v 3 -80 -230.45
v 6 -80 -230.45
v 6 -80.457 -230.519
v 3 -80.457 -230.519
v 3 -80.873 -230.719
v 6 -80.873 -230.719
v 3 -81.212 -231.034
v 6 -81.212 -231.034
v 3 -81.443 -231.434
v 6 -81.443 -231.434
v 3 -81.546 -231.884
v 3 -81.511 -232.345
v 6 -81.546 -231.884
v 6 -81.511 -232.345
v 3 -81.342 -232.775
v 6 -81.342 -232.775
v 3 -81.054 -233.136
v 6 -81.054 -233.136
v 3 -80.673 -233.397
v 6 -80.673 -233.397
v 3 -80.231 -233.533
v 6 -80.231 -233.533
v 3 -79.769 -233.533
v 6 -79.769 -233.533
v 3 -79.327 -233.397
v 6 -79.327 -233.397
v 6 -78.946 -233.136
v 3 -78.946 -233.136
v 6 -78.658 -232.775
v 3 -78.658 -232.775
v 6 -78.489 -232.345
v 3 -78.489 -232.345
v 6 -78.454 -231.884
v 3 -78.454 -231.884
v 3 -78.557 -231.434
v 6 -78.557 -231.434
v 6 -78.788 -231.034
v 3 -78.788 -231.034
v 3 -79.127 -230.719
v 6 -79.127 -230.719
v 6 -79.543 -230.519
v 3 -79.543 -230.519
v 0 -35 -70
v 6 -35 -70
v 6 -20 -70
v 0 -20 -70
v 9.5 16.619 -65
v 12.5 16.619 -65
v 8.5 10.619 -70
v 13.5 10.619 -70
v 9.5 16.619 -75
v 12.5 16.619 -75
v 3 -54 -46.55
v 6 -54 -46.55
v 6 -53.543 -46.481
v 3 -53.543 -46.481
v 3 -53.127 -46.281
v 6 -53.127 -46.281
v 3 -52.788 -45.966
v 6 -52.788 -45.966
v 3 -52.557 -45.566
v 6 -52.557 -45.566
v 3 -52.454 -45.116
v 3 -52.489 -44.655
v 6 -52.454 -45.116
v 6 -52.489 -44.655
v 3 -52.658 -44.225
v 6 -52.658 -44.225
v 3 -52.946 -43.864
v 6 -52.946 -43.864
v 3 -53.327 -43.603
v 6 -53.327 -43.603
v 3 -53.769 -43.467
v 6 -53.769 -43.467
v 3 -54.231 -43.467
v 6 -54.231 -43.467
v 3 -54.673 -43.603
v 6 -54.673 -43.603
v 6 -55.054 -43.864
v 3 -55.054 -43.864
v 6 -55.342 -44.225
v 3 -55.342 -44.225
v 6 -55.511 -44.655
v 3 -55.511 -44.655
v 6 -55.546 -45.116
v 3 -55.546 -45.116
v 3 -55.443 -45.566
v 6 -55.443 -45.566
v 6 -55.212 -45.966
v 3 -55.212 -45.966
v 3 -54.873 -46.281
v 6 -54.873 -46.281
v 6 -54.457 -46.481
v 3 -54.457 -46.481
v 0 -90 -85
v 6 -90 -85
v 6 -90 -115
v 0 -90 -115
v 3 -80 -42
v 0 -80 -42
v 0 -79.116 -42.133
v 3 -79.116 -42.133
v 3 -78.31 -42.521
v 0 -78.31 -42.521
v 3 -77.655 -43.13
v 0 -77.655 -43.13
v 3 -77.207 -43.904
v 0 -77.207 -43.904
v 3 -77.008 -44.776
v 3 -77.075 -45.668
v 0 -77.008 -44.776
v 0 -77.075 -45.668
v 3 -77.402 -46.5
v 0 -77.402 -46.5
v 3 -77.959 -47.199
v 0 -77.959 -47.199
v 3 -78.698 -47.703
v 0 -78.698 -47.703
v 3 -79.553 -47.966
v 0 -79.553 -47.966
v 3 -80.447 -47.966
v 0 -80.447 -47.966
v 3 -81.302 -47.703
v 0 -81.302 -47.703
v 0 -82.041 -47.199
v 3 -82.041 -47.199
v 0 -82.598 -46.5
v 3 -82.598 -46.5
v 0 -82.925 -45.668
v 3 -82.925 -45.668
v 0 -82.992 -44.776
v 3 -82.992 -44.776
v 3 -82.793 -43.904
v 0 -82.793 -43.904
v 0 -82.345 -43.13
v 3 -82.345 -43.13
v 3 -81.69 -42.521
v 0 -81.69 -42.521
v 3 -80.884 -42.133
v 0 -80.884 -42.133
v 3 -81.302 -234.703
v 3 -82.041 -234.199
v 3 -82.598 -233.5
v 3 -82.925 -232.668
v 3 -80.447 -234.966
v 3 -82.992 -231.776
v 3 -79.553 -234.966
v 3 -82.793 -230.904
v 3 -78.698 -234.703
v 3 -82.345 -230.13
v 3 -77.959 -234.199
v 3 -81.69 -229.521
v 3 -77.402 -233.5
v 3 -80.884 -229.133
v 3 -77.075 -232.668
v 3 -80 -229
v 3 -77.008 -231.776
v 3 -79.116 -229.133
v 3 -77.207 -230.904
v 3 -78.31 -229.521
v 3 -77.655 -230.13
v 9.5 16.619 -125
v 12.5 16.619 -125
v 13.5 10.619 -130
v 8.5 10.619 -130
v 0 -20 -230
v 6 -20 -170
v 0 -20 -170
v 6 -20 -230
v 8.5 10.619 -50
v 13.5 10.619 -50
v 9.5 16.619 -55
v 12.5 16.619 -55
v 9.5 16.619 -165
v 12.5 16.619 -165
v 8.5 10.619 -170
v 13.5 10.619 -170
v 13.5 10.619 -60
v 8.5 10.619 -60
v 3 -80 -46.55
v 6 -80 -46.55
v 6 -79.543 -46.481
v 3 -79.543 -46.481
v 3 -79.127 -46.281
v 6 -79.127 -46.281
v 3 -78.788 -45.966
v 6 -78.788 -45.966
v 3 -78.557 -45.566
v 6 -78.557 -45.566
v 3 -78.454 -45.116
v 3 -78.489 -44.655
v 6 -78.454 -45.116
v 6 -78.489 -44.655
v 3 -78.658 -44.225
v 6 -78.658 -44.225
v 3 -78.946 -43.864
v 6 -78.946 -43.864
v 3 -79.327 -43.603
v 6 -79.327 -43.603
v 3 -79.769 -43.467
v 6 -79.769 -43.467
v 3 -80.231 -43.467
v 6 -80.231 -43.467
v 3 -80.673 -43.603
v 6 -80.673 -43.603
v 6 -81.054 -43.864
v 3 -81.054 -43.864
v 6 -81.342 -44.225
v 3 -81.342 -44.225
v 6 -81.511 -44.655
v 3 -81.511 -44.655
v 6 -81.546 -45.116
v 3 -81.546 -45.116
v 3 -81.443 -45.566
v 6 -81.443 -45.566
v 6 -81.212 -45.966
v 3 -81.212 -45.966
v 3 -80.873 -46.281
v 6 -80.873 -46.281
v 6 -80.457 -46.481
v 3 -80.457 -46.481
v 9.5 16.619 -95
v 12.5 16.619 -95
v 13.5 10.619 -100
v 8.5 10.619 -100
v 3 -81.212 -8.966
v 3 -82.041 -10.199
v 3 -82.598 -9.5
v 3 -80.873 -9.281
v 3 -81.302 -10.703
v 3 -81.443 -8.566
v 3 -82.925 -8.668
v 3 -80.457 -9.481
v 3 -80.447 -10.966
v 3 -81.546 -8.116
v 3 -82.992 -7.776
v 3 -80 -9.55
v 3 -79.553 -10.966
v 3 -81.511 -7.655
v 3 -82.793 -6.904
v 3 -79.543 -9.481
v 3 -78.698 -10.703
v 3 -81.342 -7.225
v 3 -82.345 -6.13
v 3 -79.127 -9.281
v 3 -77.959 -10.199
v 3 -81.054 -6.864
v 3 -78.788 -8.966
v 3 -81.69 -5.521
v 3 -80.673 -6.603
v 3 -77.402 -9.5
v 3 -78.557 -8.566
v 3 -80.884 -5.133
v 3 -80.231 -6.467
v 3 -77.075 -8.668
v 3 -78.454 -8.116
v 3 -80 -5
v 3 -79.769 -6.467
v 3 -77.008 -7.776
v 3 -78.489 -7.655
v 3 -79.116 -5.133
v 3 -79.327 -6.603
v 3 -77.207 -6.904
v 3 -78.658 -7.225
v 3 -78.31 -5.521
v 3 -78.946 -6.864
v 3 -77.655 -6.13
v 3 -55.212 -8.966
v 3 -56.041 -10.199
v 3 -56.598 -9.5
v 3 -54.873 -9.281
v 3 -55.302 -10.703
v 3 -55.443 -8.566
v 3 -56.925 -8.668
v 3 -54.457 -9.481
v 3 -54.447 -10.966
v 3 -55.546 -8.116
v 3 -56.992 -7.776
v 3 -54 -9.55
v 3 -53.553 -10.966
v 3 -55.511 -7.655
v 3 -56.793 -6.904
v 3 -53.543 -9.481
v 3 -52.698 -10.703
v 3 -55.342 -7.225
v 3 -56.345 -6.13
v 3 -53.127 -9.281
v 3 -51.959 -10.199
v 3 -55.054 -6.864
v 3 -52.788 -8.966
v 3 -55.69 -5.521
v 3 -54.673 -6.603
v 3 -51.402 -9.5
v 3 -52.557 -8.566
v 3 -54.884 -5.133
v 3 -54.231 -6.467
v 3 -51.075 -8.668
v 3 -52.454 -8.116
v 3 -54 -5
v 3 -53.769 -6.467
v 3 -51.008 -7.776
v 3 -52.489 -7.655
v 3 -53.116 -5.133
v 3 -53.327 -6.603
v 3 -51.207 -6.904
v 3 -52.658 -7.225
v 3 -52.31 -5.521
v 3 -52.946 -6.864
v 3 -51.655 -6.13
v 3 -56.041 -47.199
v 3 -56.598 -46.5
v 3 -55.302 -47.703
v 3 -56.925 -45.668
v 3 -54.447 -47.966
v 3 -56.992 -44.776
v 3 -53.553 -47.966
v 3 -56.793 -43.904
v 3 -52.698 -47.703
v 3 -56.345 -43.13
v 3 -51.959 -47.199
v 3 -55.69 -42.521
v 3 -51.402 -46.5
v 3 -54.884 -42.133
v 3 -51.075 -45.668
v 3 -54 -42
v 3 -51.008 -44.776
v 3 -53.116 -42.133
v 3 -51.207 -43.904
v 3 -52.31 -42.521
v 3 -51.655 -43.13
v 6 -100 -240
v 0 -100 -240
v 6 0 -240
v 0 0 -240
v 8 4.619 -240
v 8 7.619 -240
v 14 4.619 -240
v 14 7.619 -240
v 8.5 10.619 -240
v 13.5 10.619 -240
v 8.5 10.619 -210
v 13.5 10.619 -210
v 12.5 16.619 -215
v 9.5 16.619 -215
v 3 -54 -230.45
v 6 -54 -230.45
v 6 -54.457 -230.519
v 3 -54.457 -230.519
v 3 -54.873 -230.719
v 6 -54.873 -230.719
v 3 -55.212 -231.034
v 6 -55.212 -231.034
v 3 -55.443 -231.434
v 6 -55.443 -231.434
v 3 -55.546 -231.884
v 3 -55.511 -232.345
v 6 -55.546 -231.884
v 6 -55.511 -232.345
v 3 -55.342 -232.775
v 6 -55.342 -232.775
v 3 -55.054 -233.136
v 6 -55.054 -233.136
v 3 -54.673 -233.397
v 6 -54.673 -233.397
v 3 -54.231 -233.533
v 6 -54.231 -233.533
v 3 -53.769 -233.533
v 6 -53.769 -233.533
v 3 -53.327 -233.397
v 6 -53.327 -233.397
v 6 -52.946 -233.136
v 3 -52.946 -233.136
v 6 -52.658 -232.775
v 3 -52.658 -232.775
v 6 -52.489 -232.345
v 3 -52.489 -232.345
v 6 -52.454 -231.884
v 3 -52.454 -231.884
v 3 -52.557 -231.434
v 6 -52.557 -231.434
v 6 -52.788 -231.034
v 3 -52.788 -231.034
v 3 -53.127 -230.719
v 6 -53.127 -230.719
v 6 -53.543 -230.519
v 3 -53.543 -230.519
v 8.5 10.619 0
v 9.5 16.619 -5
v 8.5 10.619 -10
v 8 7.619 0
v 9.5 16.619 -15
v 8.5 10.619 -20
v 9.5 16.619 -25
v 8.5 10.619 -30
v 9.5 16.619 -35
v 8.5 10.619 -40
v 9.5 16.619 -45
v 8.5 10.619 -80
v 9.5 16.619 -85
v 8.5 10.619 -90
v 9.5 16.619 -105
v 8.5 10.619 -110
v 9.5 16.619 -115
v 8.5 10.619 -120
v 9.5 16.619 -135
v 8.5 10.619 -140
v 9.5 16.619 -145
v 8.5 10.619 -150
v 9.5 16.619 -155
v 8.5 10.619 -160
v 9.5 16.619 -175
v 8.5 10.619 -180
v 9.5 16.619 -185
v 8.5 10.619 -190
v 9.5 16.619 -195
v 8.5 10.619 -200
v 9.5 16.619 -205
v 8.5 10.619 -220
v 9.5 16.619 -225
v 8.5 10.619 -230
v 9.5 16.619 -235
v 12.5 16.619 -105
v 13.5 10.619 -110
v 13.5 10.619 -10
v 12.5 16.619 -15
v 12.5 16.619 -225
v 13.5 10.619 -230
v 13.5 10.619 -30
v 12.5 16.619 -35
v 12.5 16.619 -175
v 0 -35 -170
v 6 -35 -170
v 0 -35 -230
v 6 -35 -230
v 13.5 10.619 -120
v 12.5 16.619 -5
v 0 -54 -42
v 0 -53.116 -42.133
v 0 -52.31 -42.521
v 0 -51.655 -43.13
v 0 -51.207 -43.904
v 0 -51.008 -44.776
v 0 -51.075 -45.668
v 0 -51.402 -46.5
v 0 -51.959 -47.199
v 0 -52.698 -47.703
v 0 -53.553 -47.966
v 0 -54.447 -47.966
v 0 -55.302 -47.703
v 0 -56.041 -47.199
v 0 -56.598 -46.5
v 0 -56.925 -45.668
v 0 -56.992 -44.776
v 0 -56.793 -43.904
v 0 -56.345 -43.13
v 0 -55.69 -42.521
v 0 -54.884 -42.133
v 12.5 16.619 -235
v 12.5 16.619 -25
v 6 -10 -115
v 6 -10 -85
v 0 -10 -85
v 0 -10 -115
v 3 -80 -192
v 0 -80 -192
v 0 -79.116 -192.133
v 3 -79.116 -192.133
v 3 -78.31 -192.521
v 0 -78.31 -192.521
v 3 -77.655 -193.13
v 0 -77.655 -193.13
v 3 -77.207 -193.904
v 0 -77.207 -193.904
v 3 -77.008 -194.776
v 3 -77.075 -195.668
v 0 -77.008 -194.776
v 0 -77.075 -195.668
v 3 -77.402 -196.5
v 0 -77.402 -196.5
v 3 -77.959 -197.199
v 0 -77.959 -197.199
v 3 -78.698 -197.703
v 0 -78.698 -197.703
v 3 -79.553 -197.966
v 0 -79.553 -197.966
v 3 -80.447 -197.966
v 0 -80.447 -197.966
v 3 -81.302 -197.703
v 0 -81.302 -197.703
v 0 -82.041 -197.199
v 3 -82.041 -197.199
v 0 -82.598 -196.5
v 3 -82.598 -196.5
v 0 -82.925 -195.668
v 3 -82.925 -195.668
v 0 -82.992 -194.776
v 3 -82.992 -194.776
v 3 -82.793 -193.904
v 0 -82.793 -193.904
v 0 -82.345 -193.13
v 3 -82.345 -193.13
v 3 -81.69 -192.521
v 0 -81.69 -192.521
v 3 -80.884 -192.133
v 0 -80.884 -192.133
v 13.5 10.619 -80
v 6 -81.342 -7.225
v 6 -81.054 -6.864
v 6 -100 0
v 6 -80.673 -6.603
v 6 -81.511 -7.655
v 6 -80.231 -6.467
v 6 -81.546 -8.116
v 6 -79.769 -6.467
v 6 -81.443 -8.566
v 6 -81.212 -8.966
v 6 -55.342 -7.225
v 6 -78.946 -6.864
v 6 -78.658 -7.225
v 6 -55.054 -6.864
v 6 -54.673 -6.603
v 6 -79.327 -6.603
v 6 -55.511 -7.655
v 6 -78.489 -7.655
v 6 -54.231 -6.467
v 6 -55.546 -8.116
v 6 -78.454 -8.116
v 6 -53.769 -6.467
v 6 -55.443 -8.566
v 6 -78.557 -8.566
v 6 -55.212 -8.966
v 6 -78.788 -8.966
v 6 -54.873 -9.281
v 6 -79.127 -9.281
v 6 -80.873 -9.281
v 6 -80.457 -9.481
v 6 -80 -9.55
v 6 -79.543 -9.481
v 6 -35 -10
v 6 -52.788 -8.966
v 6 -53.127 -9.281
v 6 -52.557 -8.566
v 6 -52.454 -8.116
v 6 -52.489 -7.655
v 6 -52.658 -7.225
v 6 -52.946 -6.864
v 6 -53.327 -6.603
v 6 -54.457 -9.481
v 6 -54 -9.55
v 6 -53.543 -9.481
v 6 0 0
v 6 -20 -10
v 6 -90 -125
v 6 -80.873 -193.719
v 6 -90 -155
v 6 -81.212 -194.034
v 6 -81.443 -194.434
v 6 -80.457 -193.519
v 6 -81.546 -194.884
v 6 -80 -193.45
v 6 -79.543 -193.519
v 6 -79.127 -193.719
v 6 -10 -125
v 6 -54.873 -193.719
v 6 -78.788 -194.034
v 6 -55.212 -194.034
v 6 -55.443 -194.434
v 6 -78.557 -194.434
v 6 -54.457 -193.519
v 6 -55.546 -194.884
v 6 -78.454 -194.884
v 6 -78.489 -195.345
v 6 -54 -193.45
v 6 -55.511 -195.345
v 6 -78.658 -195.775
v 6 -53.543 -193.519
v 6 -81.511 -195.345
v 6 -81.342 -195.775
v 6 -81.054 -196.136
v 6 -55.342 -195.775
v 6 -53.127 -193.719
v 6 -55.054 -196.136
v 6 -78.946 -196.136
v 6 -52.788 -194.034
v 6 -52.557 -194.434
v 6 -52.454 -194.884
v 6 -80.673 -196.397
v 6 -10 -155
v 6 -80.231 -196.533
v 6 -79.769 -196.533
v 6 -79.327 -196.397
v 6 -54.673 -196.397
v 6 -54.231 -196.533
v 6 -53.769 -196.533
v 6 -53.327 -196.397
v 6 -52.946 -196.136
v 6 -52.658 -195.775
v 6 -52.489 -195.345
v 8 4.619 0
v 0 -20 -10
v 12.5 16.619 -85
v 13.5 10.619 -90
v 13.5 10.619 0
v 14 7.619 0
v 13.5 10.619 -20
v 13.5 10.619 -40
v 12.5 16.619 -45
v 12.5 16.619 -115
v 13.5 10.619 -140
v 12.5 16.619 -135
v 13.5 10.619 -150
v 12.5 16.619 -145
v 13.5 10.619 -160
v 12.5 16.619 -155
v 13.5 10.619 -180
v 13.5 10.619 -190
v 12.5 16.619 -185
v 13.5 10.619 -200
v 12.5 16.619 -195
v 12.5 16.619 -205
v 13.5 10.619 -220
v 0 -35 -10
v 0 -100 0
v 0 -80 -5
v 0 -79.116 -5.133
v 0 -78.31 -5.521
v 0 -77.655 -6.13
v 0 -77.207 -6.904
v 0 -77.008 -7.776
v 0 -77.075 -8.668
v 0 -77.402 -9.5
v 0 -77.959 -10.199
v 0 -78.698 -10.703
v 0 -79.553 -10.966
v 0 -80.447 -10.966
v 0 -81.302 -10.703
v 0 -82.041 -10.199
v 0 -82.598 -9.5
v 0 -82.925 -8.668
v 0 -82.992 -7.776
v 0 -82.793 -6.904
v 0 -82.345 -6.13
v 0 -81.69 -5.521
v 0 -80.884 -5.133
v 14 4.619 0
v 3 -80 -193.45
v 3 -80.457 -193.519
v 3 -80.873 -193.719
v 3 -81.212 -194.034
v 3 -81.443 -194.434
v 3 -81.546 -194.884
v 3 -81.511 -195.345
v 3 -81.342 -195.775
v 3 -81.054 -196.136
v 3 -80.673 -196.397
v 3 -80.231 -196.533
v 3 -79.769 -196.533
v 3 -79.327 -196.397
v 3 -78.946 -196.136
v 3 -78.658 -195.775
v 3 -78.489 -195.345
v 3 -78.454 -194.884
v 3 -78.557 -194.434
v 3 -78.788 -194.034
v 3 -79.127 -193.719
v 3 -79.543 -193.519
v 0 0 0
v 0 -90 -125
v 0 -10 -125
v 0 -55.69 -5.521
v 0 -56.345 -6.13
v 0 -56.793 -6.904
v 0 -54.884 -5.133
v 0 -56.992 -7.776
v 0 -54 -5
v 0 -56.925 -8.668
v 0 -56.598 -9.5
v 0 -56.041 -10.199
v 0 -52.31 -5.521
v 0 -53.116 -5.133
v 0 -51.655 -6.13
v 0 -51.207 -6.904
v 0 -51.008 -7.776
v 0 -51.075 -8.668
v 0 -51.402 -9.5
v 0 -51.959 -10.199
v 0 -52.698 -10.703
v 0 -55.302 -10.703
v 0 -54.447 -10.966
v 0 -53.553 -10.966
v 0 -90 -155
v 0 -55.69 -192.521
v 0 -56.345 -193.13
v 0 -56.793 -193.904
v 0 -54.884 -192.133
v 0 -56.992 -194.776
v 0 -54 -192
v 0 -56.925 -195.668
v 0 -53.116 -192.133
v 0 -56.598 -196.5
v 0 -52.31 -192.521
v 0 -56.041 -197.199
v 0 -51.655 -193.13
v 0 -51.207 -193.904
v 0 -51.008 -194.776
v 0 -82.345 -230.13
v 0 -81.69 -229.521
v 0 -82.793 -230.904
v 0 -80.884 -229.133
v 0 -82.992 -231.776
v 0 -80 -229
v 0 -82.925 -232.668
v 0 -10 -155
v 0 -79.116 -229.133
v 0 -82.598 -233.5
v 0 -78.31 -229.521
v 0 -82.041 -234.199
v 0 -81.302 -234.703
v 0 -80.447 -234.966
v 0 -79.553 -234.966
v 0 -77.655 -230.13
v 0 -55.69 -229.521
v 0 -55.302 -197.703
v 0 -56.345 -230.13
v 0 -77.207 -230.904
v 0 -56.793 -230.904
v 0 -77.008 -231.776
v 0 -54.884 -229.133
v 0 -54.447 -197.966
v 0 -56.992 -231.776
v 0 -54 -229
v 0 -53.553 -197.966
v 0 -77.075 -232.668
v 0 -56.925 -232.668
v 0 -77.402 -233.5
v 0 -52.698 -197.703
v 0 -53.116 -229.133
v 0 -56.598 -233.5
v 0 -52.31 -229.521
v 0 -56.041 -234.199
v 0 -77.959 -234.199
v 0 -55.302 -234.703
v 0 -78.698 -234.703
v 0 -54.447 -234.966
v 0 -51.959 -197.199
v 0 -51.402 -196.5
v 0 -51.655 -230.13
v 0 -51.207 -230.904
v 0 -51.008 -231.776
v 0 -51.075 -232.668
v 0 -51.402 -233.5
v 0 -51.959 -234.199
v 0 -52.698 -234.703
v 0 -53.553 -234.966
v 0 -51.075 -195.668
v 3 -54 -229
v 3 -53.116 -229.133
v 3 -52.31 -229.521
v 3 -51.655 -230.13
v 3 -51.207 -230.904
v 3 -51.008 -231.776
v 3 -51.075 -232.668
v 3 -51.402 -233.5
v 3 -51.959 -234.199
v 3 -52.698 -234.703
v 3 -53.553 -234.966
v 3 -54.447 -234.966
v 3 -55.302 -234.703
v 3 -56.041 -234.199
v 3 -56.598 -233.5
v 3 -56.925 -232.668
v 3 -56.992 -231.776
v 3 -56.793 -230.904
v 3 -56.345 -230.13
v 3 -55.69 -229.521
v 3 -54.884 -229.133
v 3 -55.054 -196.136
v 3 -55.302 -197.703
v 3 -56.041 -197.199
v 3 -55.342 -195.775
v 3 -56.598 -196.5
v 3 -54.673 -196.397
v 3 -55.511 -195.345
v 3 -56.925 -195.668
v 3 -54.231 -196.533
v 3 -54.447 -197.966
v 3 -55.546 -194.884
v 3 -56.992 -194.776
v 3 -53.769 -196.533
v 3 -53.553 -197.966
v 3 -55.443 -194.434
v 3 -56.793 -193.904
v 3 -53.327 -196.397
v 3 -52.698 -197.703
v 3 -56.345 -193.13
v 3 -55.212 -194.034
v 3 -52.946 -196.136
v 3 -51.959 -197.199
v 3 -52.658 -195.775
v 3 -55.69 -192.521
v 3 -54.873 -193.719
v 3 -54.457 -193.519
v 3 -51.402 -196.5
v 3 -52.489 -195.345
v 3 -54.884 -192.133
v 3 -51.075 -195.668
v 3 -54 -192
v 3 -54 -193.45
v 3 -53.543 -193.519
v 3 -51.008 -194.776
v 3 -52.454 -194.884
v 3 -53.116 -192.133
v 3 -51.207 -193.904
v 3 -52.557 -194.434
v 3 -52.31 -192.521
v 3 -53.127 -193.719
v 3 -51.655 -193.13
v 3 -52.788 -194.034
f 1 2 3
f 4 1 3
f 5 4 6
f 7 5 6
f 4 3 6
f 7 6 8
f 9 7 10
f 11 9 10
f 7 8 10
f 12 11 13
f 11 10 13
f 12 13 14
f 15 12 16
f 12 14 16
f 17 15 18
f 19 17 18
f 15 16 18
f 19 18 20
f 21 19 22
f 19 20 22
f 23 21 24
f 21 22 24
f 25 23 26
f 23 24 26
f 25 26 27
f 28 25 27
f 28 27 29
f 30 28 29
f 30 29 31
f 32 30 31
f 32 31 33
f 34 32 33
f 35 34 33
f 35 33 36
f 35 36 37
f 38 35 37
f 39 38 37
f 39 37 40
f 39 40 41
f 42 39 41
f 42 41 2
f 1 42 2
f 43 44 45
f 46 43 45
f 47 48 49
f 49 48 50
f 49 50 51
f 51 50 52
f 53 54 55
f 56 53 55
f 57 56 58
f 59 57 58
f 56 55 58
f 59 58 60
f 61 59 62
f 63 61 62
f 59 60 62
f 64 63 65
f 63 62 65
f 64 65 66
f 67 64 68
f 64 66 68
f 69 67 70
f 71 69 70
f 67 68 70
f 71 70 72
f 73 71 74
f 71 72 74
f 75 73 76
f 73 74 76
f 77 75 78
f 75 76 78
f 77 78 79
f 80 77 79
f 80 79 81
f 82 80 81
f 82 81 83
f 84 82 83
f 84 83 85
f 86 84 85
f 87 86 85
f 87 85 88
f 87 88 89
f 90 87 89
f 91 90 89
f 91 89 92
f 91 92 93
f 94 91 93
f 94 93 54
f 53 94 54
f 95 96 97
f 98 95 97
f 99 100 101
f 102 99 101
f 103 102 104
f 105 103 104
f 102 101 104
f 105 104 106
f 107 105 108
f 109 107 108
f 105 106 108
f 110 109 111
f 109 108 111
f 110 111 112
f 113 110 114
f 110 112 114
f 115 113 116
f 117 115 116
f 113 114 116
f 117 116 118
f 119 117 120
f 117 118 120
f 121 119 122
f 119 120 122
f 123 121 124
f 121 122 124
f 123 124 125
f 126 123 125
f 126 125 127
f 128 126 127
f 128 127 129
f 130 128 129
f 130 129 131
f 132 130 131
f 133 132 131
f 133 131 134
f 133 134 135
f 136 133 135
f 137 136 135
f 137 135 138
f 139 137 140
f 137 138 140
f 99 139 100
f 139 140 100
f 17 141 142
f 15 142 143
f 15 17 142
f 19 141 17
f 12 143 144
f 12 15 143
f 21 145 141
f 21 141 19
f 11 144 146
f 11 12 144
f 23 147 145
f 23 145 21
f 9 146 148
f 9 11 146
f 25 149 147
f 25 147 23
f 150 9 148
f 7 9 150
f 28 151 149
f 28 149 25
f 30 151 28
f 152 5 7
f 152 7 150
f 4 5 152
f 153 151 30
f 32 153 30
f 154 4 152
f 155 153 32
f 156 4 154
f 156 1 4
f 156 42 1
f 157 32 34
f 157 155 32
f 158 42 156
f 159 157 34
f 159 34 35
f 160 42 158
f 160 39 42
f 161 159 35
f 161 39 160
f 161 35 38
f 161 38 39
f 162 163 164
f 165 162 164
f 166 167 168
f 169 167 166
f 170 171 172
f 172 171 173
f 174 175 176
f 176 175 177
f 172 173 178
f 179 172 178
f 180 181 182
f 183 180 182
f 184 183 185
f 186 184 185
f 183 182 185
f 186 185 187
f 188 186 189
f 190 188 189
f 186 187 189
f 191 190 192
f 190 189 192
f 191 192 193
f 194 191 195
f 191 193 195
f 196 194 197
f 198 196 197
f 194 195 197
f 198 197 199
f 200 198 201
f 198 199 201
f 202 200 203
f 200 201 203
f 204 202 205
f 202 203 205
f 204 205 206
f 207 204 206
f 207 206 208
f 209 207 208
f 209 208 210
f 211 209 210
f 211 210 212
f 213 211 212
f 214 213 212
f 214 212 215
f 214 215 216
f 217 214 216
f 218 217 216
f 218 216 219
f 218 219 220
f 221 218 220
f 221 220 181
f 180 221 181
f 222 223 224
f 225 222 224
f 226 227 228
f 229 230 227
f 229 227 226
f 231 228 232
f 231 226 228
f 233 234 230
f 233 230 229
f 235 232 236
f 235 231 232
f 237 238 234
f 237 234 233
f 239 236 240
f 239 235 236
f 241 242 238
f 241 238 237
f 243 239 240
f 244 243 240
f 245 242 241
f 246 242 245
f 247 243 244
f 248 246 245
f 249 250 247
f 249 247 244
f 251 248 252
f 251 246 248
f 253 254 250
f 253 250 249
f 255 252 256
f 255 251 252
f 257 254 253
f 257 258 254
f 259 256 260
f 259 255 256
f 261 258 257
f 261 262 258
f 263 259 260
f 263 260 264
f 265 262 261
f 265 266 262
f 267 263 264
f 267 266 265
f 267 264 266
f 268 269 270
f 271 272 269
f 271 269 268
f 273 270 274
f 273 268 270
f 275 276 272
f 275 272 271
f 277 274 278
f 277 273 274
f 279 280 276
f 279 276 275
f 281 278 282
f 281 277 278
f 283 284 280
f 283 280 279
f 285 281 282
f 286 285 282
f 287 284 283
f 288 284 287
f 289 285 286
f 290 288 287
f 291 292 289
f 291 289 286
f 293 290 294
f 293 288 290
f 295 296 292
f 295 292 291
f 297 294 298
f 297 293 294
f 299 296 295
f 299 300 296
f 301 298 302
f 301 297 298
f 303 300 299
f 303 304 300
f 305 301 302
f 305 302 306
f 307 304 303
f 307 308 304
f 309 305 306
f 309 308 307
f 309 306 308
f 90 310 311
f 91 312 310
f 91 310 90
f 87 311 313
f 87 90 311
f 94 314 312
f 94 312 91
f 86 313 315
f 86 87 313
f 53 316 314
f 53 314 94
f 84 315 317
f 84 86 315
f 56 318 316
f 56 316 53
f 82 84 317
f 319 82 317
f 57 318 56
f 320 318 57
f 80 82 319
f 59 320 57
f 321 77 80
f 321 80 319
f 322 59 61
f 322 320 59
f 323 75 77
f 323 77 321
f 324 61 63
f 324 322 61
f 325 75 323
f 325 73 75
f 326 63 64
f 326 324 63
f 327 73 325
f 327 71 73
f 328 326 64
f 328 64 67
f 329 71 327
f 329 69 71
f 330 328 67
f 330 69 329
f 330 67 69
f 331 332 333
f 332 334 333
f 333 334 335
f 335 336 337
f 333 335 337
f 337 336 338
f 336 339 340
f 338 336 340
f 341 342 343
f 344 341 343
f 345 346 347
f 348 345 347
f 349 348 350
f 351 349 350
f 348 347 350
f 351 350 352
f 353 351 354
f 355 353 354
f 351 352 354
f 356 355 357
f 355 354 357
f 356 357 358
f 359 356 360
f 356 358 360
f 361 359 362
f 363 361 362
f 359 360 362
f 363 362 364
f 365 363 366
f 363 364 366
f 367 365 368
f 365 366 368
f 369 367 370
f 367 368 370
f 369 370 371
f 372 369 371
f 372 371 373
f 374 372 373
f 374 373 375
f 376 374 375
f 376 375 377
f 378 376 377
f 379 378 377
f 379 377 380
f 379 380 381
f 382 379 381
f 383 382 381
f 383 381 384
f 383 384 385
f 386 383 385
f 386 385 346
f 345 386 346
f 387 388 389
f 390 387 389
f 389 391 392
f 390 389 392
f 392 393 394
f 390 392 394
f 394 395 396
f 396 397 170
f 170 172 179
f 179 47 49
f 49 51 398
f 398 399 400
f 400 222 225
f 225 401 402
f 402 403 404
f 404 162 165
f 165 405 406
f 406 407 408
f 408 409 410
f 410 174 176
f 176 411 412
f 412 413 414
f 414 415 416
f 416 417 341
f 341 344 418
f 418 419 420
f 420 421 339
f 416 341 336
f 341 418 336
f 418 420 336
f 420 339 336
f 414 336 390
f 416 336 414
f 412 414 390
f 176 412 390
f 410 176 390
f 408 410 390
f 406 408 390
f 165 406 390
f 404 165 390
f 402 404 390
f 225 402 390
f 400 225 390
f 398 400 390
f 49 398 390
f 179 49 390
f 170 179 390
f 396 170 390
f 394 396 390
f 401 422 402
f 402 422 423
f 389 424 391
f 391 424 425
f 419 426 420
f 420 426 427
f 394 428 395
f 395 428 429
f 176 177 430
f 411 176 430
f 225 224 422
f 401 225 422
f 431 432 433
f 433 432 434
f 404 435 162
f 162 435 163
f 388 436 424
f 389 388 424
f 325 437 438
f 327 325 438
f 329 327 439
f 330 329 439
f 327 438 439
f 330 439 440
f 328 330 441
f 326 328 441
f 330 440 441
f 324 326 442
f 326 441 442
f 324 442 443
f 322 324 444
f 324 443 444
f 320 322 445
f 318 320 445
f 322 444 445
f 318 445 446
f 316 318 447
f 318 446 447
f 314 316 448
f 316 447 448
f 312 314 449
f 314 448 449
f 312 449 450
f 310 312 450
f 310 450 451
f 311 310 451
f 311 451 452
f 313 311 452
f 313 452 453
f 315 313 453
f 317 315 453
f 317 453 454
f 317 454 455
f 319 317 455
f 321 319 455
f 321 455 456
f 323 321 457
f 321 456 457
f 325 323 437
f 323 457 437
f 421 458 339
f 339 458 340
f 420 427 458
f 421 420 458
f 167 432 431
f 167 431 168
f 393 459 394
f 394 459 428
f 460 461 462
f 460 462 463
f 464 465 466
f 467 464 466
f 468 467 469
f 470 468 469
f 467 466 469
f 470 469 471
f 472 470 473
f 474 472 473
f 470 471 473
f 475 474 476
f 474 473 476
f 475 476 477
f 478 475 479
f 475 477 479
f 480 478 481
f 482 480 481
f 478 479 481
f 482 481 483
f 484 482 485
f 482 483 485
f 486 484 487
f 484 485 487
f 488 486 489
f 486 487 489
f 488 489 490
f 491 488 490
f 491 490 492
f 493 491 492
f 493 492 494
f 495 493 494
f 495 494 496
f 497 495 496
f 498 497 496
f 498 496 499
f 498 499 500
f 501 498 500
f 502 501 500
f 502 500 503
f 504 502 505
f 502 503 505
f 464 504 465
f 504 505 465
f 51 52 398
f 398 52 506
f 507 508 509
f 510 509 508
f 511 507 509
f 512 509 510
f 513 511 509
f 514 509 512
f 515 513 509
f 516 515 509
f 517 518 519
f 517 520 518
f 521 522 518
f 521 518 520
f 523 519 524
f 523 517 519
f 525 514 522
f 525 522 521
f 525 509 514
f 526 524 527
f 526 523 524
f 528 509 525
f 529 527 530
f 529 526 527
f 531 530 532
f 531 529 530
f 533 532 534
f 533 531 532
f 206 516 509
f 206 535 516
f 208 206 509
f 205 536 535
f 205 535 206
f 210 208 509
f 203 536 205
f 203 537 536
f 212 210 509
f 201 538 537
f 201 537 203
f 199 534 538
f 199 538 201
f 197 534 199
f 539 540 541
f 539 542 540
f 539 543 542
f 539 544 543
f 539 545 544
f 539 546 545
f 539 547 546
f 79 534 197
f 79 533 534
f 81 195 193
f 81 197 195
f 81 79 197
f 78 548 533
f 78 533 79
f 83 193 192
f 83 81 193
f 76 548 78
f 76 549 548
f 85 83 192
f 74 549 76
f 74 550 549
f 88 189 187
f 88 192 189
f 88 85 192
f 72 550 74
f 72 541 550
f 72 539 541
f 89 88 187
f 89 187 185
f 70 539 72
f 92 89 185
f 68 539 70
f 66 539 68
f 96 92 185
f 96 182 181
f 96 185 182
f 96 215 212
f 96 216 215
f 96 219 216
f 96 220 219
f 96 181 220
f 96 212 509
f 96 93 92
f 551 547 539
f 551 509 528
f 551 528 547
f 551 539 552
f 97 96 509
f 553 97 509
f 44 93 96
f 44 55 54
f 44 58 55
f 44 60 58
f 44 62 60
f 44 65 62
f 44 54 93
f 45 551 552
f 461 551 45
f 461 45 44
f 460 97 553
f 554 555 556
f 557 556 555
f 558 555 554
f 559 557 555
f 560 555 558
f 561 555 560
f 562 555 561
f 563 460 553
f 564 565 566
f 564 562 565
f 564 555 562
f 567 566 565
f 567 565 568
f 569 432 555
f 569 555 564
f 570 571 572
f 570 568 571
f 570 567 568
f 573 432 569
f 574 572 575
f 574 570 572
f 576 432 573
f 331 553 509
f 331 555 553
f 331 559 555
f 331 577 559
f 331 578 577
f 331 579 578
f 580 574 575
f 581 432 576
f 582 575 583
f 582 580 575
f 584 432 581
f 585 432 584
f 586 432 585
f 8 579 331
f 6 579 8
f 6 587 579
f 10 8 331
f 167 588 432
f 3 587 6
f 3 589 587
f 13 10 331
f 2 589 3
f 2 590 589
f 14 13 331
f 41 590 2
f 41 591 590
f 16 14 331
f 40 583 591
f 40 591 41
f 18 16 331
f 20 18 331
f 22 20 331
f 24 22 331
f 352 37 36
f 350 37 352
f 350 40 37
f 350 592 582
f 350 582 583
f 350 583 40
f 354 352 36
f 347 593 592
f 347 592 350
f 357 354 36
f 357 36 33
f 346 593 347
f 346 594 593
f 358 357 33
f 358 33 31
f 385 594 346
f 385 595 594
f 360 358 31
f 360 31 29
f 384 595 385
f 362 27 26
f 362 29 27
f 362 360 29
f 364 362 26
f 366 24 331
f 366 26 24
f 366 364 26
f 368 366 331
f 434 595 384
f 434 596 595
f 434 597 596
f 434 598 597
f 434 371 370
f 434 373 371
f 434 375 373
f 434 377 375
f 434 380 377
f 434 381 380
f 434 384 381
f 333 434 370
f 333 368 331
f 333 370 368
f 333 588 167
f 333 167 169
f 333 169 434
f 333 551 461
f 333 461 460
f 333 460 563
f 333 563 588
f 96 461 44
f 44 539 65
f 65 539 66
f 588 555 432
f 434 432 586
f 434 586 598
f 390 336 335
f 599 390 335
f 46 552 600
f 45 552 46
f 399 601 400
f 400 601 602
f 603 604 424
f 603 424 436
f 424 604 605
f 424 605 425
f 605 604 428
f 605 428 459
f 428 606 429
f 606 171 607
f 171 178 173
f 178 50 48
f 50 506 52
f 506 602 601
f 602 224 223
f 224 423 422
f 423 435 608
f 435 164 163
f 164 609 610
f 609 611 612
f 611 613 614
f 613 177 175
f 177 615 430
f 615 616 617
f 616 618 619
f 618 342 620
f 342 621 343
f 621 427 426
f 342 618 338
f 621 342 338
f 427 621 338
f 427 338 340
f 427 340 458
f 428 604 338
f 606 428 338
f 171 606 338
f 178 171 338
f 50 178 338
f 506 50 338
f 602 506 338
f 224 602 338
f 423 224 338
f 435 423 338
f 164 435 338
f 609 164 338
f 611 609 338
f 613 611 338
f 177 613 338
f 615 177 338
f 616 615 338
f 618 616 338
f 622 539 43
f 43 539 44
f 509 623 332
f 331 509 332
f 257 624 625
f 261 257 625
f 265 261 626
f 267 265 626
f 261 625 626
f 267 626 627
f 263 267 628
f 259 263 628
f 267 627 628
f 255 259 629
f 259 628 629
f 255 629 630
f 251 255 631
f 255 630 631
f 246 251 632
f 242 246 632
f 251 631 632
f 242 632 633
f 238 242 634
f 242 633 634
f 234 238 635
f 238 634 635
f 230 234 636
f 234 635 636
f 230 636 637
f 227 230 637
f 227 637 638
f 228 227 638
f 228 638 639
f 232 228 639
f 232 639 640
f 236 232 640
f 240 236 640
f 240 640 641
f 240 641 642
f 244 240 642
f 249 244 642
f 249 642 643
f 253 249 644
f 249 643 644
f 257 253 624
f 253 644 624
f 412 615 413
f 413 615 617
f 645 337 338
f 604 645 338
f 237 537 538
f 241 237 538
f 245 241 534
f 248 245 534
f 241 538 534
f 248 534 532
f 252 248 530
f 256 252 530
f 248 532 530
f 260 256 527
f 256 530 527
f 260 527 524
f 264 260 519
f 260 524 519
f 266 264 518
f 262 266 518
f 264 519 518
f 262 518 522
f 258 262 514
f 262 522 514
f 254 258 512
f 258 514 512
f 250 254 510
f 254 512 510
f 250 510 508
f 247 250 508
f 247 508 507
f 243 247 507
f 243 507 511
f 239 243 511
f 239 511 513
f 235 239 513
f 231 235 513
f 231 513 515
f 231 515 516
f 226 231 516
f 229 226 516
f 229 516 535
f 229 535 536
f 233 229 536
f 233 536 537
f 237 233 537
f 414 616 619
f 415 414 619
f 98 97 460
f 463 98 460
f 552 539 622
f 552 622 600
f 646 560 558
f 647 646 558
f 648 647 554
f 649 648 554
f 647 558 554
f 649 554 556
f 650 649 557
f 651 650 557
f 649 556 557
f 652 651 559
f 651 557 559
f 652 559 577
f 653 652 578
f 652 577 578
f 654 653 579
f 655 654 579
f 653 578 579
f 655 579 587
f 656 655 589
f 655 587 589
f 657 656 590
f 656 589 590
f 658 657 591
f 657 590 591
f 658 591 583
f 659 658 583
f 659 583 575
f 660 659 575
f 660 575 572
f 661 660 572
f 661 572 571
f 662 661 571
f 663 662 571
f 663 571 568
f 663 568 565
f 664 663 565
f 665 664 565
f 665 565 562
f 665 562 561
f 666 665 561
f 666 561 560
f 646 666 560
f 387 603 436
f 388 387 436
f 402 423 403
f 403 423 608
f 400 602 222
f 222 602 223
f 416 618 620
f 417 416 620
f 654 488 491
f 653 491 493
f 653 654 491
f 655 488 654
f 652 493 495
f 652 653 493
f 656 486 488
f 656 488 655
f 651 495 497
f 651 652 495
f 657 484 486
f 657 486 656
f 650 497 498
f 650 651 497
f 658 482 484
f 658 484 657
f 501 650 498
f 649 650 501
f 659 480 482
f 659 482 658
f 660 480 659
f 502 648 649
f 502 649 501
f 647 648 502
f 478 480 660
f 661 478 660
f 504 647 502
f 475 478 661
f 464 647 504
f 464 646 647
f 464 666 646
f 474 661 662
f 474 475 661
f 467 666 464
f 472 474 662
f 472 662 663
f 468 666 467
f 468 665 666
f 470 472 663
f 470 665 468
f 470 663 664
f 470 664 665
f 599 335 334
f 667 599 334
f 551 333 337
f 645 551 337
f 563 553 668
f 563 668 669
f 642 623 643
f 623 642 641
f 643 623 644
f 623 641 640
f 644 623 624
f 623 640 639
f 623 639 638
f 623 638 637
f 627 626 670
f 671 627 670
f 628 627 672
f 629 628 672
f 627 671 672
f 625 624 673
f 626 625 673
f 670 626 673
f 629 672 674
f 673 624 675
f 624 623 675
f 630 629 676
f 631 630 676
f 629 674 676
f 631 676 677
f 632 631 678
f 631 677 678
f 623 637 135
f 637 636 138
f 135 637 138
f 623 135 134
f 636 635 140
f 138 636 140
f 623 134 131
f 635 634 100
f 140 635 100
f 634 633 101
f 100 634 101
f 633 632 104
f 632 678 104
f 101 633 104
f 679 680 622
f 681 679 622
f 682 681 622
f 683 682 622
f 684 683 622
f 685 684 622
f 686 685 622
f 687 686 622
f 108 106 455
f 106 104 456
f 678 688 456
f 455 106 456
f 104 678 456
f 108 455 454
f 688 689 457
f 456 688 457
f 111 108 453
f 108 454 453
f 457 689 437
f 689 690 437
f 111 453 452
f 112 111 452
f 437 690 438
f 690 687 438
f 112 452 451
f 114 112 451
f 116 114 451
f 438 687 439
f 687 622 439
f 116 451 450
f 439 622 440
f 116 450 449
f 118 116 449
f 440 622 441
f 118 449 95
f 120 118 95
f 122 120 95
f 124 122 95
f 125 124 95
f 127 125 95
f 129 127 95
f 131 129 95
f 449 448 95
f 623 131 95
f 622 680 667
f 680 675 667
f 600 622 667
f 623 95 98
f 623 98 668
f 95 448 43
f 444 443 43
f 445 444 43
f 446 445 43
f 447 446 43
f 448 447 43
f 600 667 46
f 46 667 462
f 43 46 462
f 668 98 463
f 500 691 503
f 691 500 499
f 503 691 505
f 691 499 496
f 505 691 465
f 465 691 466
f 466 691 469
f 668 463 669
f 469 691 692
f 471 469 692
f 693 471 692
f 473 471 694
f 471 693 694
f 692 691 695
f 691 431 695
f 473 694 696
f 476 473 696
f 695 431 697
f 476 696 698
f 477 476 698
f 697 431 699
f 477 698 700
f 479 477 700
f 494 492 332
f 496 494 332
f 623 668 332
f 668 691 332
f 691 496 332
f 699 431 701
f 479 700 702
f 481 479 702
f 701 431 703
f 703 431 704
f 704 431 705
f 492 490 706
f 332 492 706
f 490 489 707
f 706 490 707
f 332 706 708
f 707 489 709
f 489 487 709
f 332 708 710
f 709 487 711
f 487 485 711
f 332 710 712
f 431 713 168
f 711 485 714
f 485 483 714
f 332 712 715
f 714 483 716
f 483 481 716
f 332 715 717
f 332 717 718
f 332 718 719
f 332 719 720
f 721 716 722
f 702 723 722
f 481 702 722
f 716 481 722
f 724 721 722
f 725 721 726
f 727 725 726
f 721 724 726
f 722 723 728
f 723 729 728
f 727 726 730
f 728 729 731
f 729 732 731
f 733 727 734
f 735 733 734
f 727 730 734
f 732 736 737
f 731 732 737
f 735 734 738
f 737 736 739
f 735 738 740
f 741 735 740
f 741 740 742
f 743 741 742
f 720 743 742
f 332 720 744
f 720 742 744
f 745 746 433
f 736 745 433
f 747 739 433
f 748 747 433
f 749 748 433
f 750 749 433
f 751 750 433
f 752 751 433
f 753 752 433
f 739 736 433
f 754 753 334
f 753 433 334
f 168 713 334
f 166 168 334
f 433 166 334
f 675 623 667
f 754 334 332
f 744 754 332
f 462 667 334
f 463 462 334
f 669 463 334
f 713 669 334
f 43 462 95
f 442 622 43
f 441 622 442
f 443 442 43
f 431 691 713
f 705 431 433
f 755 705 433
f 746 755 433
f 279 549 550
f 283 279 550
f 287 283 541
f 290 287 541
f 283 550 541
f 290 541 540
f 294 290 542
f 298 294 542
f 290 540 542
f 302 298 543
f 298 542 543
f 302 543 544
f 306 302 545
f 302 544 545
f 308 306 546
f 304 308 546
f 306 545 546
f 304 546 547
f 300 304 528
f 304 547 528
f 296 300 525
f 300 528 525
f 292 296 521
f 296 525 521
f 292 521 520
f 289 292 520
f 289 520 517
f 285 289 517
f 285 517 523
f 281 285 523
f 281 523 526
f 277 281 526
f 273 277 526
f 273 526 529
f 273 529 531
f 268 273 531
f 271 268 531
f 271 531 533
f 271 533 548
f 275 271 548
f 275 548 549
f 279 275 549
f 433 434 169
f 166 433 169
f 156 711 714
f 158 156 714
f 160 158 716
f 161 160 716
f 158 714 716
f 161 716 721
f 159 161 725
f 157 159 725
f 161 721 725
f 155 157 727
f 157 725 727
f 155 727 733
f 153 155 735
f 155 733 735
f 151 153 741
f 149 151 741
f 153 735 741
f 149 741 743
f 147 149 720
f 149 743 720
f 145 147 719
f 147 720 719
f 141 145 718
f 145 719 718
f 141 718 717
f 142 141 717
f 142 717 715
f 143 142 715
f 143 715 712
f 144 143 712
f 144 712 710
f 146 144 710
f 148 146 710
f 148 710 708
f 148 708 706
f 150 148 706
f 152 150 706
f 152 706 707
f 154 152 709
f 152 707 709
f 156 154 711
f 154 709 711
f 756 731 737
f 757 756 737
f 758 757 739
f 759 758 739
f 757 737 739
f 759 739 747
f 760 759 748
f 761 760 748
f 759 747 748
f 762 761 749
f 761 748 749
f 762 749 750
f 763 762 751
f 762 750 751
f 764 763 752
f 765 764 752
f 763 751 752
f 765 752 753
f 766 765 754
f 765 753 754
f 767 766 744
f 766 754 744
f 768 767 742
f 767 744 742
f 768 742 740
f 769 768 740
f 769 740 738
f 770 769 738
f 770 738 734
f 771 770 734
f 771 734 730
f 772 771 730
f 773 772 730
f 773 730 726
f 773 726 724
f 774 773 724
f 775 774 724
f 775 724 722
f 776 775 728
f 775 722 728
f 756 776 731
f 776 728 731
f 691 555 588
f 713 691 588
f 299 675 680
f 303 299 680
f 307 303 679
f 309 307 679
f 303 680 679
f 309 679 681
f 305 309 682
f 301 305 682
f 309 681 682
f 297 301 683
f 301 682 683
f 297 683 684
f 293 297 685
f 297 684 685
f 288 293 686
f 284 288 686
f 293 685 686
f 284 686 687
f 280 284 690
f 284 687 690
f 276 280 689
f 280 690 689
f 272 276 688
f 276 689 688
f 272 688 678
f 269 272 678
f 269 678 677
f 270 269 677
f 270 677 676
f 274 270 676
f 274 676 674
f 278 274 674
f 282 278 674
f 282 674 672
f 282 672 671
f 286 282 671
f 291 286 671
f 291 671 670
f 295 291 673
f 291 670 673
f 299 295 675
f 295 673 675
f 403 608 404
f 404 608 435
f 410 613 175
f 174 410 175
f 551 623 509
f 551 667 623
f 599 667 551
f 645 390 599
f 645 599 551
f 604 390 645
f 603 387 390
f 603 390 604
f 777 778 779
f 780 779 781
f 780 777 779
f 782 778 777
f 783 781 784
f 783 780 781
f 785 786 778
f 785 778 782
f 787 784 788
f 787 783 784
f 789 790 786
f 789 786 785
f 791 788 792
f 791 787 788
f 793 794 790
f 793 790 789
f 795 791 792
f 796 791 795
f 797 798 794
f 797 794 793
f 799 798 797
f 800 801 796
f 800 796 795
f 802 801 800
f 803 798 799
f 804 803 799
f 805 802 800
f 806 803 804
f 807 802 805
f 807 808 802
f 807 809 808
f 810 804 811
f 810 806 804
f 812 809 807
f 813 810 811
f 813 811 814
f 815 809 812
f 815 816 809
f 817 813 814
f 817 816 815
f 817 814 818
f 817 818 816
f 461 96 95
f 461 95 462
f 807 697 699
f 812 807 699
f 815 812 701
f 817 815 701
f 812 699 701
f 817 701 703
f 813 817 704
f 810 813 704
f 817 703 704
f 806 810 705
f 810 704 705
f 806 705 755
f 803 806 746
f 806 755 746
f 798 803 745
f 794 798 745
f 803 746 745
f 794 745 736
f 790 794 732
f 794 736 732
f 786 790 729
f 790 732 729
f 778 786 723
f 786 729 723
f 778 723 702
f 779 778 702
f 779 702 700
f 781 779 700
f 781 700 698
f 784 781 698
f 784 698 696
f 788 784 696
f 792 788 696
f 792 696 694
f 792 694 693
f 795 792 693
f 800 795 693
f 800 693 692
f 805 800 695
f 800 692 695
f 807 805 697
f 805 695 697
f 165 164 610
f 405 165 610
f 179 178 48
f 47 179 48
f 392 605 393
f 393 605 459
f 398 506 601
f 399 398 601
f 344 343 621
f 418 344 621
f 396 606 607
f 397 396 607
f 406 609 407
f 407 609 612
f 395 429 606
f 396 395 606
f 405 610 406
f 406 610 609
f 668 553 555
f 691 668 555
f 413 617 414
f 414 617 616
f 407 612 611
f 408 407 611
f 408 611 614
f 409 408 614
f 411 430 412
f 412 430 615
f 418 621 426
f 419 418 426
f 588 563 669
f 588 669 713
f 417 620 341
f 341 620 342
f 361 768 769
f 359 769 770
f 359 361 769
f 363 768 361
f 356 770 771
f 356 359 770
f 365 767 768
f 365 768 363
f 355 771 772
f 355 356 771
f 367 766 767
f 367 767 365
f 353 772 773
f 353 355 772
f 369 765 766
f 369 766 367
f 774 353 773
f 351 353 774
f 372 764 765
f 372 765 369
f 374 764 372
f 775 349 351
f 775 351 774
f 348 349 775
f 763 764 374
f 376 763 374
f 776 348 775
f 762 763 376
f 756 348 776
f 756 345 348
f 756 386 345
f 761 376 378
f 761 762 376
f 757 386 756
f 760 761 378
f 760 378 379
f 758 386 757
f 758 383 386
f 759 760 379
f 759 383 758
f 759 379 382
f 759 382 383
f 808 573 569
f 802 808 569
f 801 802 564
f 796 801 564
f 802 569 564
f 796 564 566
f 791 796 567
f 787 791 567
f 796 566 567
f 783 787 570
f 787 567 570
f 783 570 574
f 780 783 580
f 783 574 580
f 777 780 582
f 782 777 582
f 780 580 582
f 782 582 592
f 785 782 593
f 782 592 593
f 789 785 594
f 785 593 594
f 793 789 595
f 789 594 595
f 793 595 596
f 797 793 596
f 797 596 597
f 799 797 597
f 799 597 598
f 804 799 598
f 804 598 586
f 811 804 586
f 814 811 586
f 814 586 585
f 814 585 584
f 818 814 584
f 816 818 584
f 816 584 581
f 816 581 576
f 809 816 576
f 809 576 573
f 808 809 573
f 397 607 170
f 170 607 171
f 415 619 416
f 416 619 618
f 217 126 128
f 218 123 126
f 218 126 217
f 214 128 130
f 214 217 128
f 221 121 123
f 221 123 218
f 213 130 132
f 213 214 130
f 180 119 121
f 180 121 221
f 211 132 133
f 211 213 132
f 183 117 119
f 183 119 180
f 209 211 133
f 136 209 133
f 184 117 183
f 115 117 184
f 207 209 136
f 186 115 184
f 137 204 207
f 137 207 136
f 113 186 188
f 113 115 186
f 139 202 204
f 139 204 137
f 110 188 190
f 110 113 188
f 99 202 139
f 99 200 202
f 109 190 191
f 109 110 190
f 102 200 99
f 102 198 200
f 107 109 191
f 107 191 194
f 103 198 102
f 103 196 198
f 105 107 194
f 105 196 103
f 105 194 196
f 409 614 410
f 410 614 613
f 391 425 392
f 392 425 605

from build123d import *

# Parameters (mm, degrees)
SKETCH_1_W             = 240
SKETCH_1_H             = 100
EXTRUDE_1_DEPTH        = 6
SKETCH_2_R             = 1.55
CUT_EXTRUDE_1_DEPTH    = 261.069221555
SKETCH_3_W             = 60
SKETCH_3_H             = 15
CUT_EXTRUDE_2_DEPTH    = 261.069221555
SKETCH_4_W             = 30
SKETCH_4_H             = 80
CUT_EXTRUDE_3_DEPTH    = 261.069221555
SKETCH_5_R             = 3
CUT_EXTRUDE_4_DEPTH    = 3
EXTRUDE_3_DEPTH        = 240
CUT_EXTRUDE_5_DEPTH    = 10
CUT_EXTRUDE_6_DEPTH    = 10
PATTERN_LINEAR_1_COUNT = 23
PATTERN_LINEAR_1_PITCH = 10
CUT_EXTRUDE_7_DEPTH    = 10
CUT_EXTRUDE_8_DEPTH    = 261.376650259


with BuildPart() as part:
    # 草图1 → 凸台-拉伸1 (new body)
    with BuildSketch(Plane(origin=(0, 0, 0), x_dir=(0, 0, -1), z_dir=(1, 0, 0))):
        with Locations((120, -50)):
            Rectangle(SKETCH_1_W, SKETCH_1_H)
    extrude(amount=EXTRUDE_1_DEPTH)

    # 草图2 → 切除-拉伸1 (cut, through all)
    with BuildSketch(Plane(origin=(6, 0, 0), x_dir=(0, 0, -1), z_dir=(1, 0, 0))):
        with Locations((8, -54)):
            Circle(SKETCH_2_R)
        with Locations((45, -80)):
            Circle(SKETCH_2_R)
        with Locations((45, -54)):
            Circle(SKETCH_2_R)
        with Locations((8, -80)):
            Circle(SKETCH_2_R)
        with Locations(Location((232, -80, 0), (0, 0, 180))):
            Circle(SKETCH_2_R)
        with Locations(Location((195, -54, 0), (0, 0, 180))):
            Circle(SKETCH_2_R)
        with Locations(Location((195, -80, 0), (0, 0, 180))):
            Circle(SKETCH_2_R)
        with Locations(Location((232, -54, 0), (0, 0, 180))):
            Circle(SKETCH_2_R)
    extrude(amount=-CUT_EXTRUDE_1_DEPTH, mode=Mode.SUBTRACT)

    # 草图3 → 切除-拉伸2 (cut, through all)
    with BuildSketch(Plane(origin=(6, 0, 0), x_dir=(0, 0, -1), z_dir=(1, 0, 0))):
        with Locations((40, -27.5)):
            Rectangle(SKETCH_3_W, SKETCH_3_H)
        with Locations((200, -27.5)):
            Rectangle(SKETCH_3_W, SKETCH_3_H)
    extrude(amount=-CUT_EXTRUDE_2_DEPTH, mode=Mode.SUBTRACT)

    # 草图4 → 切除-拉伸3 (cut, through all)
    with BuildSketch(Plane(origin=(6, 0, 0), x_dir=(0, 0, -1), z_dir=(1, 0, 0))):
        with Locations((100, -50)):
            Rectangle(SKETCH_4_W, SKETCH_4_H)
        with Locations((140, -50)):
            Rectangle(SKETCH_4_W, SKETCH_4_H)
    extrude(amount=-CUT_EXTRUDE_3_DEPTH, mode=Mode.SUBTRACT)

    # 草图5 → 切除-拉伸4 (cut)
    with BuildSketch(Plane.ZY):
        with Locations((-195, -80)):
            Circle(SKETCH_5_R)
        with Locations((-232, -80)):
            Circle(SKETCH_5_R)
        with Locations((-195, -54)):
            Circle(SKETCH_5_R)
        with Locations((-232, -54)):
            Circle(SKETCH_5_R)
        with Locations((-45, -80)):
            Circle(SKETCH_5_R)
        with Locations((-8, -80)):
            Circle(SKETCH_5_R)
        with Locations((-8, -54)):
            Circle(SKETCH_5_R)
        with Locations((-45, -54)):
            Circle(SKETCH_5_R)
    extrude(amount=-CUT_EXTRUDE_4_DEPTH, mode=Mode.SUBTRACT)

    # 草图8 → 凸台-拉伸3 (add)
    with BuildSketch(Plane(origin=(0, 0, -240), x_dir=(-1, 0, 0), z_dir=(0, 0, -1))):
        Polygon((-6, 0), (-14, 4.618802154), (-14, 16.618802154), (-8, 16.618802154), (-8, 4.618802154), (0, 0), align=None)
    extrude(amount=-EXTRUDE_3_DEPTH)

    # 草图9 → 切除-拉伸5 (cut)
    with BuildSketch(Plane(origin=(14, 0, 0), x_dir=(0, 0, -1), z_dir=(1, 0, 0))):
        Polygon((0, 16.618802154), (0, 10.618802154), (5, 16.618802154), align=None)
    extrude(amount=-CUT_EXTRUDE_5_DEPTH, mode=Mode.SUBTRACT)

    # 草图10 → 切除-拉伸6 (cut)
    with BuildSketch(Plane(origin=(14, 0, 0), x_dir=(0, 0, -1), z_dir=(1, 0, 0))):
        Polygon((5, 16.618802154), (10, 10.618802154), (15, 16.618802154), align=None)
    cut_extrude_6 = extrude(amount=-CUT_EXTRUDE_6_DEPTH, mode=Mode.SUBTRACT)

    # 阵列(线性)1: 切除-拉伸6 ×23
    with Locations(*[(0, 0, -i * PATTERN_LINEAR_1_PITCH) for i in range(1, PATTERN_LINEAR_1_COUNT)]):
        add(cut_extrude_6, mode=Mode.SUBTRACT)

    # 草图11 → 切除-拉伸7 (cut)
    with BuildSketch(Plane(origin=(14, 0, 0), x_dir=(0, 0, -1), z_dir=(1, 0, 0))):
        Polygon((235, 16.618802154), (240, 10.618802154), (240, 16.618802154), align=None)
    extrude(amount=-CUT_EXTRUDE_7_DEPTH, mode=Mode.SUBTRACT)

    # 草图12 → 切除-拉伸8 (cut, through all)
    with BuildSketch(Plane(origin=(0, 0, -240), x_dir=(-1, 0, 0), z_dir=(0, 0, -1))):
        Polygon((-14, 7.618802154), (-12.5, 16.618802154), (-14, 16.618802154), align=None)
        Polygon((-9.5, 16.618802154), (-8, 7.618802154), (-8, 16.618802154), align=None)
    extrude(amount=-CUT_EXTRUDE_8_DEPTH, mode=Mode.SUBTRACT)


solid = part.part
